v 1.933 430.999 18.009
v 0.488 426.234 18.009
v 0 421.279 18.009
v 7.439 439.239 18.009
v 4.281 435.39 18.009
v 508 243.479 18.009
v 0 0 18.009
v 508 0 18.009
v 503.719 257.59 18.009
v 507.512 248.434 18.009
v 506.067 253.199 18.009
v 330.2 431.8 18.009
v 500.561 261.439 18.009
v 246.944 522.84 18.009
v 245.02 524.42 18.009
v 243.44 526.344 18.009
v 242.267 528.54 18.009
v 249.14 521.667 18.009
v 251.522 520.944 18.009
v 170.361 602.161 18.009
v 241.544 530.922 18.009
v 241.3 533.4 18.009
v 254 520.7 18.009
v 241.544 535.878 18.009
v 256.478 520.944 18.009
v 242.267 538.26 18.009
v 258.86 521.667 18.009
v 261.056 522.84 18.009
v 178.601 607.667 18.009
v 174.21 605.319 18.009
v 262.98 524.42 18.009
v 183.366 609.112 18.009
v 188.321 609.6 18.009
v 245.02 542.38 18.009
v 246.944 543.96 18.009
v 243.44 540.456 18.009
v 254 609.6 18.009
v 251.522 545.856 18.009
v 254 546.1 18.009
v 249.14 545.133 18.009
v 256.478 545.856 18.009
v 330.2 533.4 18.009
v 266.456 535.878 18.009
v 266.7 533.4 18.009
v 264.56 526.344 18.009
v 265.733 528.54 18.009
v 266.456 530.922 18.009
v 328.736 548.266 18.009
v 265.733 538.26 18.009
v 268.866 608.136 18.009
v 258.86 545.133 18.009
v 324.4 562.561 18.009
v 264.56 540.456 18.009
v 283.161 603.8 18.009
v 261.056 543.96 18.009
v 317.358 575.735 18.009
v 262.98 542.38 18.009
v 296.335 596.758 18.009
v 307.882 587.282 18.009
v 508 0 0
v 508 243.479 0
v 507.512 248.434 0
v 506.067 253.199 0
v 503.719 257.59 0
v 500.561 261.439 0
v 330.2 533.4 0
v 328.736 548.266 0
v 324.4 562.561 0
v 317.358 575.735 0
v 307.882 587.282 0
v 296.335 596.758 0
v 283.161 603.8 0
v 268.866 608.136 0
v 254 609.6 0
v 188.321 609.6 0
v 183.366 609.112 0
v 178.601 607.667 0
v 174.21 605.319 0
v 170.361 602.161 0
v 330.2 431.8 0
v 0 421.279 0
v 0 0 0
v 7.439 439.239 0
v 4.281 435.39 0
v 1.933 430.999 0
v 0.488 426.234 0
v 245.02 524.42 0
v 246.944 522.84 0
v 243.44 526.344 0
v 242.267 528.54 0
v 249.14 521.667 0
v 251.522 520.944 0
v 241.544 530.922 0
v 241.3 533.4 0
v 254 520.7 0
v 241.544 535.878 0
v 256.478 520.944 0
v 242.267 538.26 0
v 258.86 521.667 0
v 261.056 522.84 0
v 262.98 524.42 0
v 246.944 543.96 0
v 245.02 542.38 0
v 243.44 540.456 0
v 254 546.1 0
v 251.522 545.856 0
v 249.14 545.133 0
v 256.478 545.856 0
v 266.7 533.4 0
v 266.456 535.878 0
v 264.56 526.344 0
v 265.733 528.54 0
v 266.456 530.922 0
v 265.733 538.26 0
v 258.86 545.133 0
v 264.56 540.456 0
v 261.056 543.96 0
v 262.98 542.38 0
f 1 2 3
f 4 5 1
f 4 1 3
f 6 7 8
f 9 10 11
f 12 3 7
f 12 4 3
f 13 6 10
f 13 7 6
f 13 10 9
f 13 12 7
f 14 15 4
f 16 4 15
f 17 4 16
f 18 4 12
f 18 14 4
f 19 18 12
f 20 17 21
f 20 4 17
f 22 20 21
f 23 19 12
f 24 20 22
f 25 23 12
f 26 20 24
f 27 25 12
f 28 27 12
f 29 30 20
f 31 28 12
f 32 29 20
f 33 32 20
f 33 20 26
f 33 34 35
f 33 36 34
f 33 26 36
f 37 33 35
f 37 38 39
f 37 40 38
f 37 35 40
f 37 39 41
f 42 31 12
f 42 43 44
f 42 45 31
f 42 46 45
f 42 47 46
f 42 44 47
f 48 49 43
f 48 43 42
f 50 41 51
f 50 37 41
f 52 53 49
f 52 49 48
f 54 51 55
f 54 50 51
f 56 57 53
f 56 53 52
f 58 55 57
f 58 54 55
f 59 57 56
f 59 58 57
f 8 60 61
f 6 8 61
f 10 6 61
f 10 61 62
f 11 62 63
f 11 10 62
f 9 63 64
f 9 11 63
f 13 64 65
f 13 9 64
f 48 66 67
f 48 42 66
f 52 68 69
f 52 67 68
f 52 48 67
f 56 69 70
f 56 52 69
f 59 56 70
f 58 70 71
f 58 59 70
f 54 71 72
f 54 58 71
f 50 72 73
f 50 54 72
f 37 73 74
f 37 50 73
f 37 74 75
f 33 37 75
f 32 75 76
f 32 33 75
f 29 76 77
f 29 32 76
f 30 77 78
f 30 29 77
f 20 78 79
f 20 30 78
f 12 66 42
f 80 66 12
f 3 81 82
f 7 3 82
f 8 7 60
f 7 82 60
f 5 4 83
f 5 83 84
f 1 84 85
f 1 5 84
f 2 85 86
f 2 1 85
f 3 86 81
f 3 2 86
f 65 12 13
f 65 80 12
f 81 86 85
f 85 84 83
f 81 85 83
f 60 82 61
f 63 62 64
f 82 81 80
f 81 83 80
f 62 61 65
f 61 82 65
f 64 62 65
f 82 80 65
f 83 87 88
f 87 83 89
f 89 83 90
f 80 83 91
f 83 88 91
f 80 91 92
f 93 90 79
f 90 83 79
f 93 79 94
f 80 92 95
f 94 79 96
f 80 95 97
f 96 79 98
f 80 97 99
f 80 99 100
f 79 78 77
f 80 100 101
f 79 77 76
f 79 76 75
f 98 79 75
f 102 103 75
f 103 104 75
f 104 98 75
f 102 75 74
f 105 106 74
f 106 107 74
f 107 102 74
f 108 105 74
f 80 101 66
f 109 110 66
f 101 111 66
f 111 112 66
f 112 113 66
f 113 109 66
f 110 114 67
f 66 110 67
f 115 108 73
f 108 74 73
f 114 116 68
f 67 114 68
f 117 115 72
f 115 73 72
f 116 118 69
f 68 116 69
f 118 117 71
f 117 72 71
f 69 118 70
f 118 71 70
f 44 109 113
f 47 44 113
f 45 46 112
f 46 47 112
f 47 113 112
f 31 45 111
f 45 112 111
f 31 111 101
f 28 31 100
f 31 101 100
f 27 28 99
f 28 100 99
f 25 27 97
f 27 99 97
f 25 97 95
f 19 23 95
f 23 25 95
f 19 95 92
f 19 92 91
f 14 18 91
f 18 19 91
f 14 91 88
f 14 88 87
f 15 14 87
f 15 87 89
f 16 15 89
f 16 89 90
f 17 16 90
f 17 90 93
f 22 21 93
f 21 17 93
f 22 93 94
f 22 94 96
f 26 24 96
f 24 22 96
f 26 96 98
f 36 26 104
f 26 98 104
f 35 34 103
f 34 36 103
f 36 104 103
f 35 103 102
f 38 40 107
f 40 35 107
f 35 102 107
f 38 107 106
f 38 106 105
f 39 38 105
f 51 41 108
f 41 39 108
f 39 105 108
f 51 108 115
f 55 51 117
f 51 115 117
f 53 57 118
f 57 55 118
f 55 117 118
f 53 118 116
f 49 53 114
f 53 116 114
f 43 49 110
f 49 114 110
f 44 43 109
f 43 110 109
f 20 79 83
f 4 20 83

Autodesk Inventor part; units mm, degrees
ref_plane "YZ Plane" through (0, 0, 0) normal (1, 0, 0) x (0, 1, 0)
ref_plane "XZ Plane" through (0, 0, 0) normal (0, 1, 0) x (-1, 0, 0)
ref_plane "XY Plane" through (0, 0, 0) normal (0, 0, 1) x (1, 0, 0)
sketch "Sketch1" plane through (0, 0, 0) normal (0, 0, 1) x (1, 0, 0)
  line L0 (0, 0) -> (508, 0)
  line L1 (508, 0) -> (508, 609.6)
  line L2 (508, 609.6) -> (0, 609.6)
  line L3 (0, 609.6) -> (0, 0)
  line L4 (254, 609.6) -> (177.8, 609.6)
  line L5 (177.8, 609.6) -> (125.7631, 609.6)
  line L6 (254, 609.6) -> (330.2, 609.6)
  line L7 (177.8, 609.6) -> (0, 431.8)
  line L8 (177.8, 609.6) -> (429.2472, 609.6) construction
  line L9 (330.2, 609.6) -> (330.2, 431.8)
  line L10 (330.2, 431.8) -> (508, 254)
  circle A0 centre (254, 533.4) radius 12.7
  dimension "d0" = 508
  dimension "d1" = 609.6
  dimension "d2" = 76.2
  dimension "d3" = 76.2
  dimension "d4" = 135
  dimension "d5" = 135
  dimension "d6" = 25.4
  dimension "d7" = 76.2
  dimension "d10" = 177.8
  dimension "d11" = 538.8154
  dimension "d12" = 254
  dimension "d13" = 382.2369
  dimension "d14" = 254
extrude "Extrusion1" add sketch "Sketch1" along normal blind 18.0086 contours L3 L7 L2 L9 L10 L1 L0
fillet "Fillet1" radius 76.2 1 edges at (330.2, 609.6, 9.0043)
fillet "Fillet2" radius 25.4 1 edges at (177.8, 609.6, 9.0043)
fillet "Fillet3" radius 25.4 1 edges at (0, 431.8, 9.0043)
fillet "Fillet4" radius 25.4 1 edges at (508, 254, 9.0043)
properties part number "base side"
